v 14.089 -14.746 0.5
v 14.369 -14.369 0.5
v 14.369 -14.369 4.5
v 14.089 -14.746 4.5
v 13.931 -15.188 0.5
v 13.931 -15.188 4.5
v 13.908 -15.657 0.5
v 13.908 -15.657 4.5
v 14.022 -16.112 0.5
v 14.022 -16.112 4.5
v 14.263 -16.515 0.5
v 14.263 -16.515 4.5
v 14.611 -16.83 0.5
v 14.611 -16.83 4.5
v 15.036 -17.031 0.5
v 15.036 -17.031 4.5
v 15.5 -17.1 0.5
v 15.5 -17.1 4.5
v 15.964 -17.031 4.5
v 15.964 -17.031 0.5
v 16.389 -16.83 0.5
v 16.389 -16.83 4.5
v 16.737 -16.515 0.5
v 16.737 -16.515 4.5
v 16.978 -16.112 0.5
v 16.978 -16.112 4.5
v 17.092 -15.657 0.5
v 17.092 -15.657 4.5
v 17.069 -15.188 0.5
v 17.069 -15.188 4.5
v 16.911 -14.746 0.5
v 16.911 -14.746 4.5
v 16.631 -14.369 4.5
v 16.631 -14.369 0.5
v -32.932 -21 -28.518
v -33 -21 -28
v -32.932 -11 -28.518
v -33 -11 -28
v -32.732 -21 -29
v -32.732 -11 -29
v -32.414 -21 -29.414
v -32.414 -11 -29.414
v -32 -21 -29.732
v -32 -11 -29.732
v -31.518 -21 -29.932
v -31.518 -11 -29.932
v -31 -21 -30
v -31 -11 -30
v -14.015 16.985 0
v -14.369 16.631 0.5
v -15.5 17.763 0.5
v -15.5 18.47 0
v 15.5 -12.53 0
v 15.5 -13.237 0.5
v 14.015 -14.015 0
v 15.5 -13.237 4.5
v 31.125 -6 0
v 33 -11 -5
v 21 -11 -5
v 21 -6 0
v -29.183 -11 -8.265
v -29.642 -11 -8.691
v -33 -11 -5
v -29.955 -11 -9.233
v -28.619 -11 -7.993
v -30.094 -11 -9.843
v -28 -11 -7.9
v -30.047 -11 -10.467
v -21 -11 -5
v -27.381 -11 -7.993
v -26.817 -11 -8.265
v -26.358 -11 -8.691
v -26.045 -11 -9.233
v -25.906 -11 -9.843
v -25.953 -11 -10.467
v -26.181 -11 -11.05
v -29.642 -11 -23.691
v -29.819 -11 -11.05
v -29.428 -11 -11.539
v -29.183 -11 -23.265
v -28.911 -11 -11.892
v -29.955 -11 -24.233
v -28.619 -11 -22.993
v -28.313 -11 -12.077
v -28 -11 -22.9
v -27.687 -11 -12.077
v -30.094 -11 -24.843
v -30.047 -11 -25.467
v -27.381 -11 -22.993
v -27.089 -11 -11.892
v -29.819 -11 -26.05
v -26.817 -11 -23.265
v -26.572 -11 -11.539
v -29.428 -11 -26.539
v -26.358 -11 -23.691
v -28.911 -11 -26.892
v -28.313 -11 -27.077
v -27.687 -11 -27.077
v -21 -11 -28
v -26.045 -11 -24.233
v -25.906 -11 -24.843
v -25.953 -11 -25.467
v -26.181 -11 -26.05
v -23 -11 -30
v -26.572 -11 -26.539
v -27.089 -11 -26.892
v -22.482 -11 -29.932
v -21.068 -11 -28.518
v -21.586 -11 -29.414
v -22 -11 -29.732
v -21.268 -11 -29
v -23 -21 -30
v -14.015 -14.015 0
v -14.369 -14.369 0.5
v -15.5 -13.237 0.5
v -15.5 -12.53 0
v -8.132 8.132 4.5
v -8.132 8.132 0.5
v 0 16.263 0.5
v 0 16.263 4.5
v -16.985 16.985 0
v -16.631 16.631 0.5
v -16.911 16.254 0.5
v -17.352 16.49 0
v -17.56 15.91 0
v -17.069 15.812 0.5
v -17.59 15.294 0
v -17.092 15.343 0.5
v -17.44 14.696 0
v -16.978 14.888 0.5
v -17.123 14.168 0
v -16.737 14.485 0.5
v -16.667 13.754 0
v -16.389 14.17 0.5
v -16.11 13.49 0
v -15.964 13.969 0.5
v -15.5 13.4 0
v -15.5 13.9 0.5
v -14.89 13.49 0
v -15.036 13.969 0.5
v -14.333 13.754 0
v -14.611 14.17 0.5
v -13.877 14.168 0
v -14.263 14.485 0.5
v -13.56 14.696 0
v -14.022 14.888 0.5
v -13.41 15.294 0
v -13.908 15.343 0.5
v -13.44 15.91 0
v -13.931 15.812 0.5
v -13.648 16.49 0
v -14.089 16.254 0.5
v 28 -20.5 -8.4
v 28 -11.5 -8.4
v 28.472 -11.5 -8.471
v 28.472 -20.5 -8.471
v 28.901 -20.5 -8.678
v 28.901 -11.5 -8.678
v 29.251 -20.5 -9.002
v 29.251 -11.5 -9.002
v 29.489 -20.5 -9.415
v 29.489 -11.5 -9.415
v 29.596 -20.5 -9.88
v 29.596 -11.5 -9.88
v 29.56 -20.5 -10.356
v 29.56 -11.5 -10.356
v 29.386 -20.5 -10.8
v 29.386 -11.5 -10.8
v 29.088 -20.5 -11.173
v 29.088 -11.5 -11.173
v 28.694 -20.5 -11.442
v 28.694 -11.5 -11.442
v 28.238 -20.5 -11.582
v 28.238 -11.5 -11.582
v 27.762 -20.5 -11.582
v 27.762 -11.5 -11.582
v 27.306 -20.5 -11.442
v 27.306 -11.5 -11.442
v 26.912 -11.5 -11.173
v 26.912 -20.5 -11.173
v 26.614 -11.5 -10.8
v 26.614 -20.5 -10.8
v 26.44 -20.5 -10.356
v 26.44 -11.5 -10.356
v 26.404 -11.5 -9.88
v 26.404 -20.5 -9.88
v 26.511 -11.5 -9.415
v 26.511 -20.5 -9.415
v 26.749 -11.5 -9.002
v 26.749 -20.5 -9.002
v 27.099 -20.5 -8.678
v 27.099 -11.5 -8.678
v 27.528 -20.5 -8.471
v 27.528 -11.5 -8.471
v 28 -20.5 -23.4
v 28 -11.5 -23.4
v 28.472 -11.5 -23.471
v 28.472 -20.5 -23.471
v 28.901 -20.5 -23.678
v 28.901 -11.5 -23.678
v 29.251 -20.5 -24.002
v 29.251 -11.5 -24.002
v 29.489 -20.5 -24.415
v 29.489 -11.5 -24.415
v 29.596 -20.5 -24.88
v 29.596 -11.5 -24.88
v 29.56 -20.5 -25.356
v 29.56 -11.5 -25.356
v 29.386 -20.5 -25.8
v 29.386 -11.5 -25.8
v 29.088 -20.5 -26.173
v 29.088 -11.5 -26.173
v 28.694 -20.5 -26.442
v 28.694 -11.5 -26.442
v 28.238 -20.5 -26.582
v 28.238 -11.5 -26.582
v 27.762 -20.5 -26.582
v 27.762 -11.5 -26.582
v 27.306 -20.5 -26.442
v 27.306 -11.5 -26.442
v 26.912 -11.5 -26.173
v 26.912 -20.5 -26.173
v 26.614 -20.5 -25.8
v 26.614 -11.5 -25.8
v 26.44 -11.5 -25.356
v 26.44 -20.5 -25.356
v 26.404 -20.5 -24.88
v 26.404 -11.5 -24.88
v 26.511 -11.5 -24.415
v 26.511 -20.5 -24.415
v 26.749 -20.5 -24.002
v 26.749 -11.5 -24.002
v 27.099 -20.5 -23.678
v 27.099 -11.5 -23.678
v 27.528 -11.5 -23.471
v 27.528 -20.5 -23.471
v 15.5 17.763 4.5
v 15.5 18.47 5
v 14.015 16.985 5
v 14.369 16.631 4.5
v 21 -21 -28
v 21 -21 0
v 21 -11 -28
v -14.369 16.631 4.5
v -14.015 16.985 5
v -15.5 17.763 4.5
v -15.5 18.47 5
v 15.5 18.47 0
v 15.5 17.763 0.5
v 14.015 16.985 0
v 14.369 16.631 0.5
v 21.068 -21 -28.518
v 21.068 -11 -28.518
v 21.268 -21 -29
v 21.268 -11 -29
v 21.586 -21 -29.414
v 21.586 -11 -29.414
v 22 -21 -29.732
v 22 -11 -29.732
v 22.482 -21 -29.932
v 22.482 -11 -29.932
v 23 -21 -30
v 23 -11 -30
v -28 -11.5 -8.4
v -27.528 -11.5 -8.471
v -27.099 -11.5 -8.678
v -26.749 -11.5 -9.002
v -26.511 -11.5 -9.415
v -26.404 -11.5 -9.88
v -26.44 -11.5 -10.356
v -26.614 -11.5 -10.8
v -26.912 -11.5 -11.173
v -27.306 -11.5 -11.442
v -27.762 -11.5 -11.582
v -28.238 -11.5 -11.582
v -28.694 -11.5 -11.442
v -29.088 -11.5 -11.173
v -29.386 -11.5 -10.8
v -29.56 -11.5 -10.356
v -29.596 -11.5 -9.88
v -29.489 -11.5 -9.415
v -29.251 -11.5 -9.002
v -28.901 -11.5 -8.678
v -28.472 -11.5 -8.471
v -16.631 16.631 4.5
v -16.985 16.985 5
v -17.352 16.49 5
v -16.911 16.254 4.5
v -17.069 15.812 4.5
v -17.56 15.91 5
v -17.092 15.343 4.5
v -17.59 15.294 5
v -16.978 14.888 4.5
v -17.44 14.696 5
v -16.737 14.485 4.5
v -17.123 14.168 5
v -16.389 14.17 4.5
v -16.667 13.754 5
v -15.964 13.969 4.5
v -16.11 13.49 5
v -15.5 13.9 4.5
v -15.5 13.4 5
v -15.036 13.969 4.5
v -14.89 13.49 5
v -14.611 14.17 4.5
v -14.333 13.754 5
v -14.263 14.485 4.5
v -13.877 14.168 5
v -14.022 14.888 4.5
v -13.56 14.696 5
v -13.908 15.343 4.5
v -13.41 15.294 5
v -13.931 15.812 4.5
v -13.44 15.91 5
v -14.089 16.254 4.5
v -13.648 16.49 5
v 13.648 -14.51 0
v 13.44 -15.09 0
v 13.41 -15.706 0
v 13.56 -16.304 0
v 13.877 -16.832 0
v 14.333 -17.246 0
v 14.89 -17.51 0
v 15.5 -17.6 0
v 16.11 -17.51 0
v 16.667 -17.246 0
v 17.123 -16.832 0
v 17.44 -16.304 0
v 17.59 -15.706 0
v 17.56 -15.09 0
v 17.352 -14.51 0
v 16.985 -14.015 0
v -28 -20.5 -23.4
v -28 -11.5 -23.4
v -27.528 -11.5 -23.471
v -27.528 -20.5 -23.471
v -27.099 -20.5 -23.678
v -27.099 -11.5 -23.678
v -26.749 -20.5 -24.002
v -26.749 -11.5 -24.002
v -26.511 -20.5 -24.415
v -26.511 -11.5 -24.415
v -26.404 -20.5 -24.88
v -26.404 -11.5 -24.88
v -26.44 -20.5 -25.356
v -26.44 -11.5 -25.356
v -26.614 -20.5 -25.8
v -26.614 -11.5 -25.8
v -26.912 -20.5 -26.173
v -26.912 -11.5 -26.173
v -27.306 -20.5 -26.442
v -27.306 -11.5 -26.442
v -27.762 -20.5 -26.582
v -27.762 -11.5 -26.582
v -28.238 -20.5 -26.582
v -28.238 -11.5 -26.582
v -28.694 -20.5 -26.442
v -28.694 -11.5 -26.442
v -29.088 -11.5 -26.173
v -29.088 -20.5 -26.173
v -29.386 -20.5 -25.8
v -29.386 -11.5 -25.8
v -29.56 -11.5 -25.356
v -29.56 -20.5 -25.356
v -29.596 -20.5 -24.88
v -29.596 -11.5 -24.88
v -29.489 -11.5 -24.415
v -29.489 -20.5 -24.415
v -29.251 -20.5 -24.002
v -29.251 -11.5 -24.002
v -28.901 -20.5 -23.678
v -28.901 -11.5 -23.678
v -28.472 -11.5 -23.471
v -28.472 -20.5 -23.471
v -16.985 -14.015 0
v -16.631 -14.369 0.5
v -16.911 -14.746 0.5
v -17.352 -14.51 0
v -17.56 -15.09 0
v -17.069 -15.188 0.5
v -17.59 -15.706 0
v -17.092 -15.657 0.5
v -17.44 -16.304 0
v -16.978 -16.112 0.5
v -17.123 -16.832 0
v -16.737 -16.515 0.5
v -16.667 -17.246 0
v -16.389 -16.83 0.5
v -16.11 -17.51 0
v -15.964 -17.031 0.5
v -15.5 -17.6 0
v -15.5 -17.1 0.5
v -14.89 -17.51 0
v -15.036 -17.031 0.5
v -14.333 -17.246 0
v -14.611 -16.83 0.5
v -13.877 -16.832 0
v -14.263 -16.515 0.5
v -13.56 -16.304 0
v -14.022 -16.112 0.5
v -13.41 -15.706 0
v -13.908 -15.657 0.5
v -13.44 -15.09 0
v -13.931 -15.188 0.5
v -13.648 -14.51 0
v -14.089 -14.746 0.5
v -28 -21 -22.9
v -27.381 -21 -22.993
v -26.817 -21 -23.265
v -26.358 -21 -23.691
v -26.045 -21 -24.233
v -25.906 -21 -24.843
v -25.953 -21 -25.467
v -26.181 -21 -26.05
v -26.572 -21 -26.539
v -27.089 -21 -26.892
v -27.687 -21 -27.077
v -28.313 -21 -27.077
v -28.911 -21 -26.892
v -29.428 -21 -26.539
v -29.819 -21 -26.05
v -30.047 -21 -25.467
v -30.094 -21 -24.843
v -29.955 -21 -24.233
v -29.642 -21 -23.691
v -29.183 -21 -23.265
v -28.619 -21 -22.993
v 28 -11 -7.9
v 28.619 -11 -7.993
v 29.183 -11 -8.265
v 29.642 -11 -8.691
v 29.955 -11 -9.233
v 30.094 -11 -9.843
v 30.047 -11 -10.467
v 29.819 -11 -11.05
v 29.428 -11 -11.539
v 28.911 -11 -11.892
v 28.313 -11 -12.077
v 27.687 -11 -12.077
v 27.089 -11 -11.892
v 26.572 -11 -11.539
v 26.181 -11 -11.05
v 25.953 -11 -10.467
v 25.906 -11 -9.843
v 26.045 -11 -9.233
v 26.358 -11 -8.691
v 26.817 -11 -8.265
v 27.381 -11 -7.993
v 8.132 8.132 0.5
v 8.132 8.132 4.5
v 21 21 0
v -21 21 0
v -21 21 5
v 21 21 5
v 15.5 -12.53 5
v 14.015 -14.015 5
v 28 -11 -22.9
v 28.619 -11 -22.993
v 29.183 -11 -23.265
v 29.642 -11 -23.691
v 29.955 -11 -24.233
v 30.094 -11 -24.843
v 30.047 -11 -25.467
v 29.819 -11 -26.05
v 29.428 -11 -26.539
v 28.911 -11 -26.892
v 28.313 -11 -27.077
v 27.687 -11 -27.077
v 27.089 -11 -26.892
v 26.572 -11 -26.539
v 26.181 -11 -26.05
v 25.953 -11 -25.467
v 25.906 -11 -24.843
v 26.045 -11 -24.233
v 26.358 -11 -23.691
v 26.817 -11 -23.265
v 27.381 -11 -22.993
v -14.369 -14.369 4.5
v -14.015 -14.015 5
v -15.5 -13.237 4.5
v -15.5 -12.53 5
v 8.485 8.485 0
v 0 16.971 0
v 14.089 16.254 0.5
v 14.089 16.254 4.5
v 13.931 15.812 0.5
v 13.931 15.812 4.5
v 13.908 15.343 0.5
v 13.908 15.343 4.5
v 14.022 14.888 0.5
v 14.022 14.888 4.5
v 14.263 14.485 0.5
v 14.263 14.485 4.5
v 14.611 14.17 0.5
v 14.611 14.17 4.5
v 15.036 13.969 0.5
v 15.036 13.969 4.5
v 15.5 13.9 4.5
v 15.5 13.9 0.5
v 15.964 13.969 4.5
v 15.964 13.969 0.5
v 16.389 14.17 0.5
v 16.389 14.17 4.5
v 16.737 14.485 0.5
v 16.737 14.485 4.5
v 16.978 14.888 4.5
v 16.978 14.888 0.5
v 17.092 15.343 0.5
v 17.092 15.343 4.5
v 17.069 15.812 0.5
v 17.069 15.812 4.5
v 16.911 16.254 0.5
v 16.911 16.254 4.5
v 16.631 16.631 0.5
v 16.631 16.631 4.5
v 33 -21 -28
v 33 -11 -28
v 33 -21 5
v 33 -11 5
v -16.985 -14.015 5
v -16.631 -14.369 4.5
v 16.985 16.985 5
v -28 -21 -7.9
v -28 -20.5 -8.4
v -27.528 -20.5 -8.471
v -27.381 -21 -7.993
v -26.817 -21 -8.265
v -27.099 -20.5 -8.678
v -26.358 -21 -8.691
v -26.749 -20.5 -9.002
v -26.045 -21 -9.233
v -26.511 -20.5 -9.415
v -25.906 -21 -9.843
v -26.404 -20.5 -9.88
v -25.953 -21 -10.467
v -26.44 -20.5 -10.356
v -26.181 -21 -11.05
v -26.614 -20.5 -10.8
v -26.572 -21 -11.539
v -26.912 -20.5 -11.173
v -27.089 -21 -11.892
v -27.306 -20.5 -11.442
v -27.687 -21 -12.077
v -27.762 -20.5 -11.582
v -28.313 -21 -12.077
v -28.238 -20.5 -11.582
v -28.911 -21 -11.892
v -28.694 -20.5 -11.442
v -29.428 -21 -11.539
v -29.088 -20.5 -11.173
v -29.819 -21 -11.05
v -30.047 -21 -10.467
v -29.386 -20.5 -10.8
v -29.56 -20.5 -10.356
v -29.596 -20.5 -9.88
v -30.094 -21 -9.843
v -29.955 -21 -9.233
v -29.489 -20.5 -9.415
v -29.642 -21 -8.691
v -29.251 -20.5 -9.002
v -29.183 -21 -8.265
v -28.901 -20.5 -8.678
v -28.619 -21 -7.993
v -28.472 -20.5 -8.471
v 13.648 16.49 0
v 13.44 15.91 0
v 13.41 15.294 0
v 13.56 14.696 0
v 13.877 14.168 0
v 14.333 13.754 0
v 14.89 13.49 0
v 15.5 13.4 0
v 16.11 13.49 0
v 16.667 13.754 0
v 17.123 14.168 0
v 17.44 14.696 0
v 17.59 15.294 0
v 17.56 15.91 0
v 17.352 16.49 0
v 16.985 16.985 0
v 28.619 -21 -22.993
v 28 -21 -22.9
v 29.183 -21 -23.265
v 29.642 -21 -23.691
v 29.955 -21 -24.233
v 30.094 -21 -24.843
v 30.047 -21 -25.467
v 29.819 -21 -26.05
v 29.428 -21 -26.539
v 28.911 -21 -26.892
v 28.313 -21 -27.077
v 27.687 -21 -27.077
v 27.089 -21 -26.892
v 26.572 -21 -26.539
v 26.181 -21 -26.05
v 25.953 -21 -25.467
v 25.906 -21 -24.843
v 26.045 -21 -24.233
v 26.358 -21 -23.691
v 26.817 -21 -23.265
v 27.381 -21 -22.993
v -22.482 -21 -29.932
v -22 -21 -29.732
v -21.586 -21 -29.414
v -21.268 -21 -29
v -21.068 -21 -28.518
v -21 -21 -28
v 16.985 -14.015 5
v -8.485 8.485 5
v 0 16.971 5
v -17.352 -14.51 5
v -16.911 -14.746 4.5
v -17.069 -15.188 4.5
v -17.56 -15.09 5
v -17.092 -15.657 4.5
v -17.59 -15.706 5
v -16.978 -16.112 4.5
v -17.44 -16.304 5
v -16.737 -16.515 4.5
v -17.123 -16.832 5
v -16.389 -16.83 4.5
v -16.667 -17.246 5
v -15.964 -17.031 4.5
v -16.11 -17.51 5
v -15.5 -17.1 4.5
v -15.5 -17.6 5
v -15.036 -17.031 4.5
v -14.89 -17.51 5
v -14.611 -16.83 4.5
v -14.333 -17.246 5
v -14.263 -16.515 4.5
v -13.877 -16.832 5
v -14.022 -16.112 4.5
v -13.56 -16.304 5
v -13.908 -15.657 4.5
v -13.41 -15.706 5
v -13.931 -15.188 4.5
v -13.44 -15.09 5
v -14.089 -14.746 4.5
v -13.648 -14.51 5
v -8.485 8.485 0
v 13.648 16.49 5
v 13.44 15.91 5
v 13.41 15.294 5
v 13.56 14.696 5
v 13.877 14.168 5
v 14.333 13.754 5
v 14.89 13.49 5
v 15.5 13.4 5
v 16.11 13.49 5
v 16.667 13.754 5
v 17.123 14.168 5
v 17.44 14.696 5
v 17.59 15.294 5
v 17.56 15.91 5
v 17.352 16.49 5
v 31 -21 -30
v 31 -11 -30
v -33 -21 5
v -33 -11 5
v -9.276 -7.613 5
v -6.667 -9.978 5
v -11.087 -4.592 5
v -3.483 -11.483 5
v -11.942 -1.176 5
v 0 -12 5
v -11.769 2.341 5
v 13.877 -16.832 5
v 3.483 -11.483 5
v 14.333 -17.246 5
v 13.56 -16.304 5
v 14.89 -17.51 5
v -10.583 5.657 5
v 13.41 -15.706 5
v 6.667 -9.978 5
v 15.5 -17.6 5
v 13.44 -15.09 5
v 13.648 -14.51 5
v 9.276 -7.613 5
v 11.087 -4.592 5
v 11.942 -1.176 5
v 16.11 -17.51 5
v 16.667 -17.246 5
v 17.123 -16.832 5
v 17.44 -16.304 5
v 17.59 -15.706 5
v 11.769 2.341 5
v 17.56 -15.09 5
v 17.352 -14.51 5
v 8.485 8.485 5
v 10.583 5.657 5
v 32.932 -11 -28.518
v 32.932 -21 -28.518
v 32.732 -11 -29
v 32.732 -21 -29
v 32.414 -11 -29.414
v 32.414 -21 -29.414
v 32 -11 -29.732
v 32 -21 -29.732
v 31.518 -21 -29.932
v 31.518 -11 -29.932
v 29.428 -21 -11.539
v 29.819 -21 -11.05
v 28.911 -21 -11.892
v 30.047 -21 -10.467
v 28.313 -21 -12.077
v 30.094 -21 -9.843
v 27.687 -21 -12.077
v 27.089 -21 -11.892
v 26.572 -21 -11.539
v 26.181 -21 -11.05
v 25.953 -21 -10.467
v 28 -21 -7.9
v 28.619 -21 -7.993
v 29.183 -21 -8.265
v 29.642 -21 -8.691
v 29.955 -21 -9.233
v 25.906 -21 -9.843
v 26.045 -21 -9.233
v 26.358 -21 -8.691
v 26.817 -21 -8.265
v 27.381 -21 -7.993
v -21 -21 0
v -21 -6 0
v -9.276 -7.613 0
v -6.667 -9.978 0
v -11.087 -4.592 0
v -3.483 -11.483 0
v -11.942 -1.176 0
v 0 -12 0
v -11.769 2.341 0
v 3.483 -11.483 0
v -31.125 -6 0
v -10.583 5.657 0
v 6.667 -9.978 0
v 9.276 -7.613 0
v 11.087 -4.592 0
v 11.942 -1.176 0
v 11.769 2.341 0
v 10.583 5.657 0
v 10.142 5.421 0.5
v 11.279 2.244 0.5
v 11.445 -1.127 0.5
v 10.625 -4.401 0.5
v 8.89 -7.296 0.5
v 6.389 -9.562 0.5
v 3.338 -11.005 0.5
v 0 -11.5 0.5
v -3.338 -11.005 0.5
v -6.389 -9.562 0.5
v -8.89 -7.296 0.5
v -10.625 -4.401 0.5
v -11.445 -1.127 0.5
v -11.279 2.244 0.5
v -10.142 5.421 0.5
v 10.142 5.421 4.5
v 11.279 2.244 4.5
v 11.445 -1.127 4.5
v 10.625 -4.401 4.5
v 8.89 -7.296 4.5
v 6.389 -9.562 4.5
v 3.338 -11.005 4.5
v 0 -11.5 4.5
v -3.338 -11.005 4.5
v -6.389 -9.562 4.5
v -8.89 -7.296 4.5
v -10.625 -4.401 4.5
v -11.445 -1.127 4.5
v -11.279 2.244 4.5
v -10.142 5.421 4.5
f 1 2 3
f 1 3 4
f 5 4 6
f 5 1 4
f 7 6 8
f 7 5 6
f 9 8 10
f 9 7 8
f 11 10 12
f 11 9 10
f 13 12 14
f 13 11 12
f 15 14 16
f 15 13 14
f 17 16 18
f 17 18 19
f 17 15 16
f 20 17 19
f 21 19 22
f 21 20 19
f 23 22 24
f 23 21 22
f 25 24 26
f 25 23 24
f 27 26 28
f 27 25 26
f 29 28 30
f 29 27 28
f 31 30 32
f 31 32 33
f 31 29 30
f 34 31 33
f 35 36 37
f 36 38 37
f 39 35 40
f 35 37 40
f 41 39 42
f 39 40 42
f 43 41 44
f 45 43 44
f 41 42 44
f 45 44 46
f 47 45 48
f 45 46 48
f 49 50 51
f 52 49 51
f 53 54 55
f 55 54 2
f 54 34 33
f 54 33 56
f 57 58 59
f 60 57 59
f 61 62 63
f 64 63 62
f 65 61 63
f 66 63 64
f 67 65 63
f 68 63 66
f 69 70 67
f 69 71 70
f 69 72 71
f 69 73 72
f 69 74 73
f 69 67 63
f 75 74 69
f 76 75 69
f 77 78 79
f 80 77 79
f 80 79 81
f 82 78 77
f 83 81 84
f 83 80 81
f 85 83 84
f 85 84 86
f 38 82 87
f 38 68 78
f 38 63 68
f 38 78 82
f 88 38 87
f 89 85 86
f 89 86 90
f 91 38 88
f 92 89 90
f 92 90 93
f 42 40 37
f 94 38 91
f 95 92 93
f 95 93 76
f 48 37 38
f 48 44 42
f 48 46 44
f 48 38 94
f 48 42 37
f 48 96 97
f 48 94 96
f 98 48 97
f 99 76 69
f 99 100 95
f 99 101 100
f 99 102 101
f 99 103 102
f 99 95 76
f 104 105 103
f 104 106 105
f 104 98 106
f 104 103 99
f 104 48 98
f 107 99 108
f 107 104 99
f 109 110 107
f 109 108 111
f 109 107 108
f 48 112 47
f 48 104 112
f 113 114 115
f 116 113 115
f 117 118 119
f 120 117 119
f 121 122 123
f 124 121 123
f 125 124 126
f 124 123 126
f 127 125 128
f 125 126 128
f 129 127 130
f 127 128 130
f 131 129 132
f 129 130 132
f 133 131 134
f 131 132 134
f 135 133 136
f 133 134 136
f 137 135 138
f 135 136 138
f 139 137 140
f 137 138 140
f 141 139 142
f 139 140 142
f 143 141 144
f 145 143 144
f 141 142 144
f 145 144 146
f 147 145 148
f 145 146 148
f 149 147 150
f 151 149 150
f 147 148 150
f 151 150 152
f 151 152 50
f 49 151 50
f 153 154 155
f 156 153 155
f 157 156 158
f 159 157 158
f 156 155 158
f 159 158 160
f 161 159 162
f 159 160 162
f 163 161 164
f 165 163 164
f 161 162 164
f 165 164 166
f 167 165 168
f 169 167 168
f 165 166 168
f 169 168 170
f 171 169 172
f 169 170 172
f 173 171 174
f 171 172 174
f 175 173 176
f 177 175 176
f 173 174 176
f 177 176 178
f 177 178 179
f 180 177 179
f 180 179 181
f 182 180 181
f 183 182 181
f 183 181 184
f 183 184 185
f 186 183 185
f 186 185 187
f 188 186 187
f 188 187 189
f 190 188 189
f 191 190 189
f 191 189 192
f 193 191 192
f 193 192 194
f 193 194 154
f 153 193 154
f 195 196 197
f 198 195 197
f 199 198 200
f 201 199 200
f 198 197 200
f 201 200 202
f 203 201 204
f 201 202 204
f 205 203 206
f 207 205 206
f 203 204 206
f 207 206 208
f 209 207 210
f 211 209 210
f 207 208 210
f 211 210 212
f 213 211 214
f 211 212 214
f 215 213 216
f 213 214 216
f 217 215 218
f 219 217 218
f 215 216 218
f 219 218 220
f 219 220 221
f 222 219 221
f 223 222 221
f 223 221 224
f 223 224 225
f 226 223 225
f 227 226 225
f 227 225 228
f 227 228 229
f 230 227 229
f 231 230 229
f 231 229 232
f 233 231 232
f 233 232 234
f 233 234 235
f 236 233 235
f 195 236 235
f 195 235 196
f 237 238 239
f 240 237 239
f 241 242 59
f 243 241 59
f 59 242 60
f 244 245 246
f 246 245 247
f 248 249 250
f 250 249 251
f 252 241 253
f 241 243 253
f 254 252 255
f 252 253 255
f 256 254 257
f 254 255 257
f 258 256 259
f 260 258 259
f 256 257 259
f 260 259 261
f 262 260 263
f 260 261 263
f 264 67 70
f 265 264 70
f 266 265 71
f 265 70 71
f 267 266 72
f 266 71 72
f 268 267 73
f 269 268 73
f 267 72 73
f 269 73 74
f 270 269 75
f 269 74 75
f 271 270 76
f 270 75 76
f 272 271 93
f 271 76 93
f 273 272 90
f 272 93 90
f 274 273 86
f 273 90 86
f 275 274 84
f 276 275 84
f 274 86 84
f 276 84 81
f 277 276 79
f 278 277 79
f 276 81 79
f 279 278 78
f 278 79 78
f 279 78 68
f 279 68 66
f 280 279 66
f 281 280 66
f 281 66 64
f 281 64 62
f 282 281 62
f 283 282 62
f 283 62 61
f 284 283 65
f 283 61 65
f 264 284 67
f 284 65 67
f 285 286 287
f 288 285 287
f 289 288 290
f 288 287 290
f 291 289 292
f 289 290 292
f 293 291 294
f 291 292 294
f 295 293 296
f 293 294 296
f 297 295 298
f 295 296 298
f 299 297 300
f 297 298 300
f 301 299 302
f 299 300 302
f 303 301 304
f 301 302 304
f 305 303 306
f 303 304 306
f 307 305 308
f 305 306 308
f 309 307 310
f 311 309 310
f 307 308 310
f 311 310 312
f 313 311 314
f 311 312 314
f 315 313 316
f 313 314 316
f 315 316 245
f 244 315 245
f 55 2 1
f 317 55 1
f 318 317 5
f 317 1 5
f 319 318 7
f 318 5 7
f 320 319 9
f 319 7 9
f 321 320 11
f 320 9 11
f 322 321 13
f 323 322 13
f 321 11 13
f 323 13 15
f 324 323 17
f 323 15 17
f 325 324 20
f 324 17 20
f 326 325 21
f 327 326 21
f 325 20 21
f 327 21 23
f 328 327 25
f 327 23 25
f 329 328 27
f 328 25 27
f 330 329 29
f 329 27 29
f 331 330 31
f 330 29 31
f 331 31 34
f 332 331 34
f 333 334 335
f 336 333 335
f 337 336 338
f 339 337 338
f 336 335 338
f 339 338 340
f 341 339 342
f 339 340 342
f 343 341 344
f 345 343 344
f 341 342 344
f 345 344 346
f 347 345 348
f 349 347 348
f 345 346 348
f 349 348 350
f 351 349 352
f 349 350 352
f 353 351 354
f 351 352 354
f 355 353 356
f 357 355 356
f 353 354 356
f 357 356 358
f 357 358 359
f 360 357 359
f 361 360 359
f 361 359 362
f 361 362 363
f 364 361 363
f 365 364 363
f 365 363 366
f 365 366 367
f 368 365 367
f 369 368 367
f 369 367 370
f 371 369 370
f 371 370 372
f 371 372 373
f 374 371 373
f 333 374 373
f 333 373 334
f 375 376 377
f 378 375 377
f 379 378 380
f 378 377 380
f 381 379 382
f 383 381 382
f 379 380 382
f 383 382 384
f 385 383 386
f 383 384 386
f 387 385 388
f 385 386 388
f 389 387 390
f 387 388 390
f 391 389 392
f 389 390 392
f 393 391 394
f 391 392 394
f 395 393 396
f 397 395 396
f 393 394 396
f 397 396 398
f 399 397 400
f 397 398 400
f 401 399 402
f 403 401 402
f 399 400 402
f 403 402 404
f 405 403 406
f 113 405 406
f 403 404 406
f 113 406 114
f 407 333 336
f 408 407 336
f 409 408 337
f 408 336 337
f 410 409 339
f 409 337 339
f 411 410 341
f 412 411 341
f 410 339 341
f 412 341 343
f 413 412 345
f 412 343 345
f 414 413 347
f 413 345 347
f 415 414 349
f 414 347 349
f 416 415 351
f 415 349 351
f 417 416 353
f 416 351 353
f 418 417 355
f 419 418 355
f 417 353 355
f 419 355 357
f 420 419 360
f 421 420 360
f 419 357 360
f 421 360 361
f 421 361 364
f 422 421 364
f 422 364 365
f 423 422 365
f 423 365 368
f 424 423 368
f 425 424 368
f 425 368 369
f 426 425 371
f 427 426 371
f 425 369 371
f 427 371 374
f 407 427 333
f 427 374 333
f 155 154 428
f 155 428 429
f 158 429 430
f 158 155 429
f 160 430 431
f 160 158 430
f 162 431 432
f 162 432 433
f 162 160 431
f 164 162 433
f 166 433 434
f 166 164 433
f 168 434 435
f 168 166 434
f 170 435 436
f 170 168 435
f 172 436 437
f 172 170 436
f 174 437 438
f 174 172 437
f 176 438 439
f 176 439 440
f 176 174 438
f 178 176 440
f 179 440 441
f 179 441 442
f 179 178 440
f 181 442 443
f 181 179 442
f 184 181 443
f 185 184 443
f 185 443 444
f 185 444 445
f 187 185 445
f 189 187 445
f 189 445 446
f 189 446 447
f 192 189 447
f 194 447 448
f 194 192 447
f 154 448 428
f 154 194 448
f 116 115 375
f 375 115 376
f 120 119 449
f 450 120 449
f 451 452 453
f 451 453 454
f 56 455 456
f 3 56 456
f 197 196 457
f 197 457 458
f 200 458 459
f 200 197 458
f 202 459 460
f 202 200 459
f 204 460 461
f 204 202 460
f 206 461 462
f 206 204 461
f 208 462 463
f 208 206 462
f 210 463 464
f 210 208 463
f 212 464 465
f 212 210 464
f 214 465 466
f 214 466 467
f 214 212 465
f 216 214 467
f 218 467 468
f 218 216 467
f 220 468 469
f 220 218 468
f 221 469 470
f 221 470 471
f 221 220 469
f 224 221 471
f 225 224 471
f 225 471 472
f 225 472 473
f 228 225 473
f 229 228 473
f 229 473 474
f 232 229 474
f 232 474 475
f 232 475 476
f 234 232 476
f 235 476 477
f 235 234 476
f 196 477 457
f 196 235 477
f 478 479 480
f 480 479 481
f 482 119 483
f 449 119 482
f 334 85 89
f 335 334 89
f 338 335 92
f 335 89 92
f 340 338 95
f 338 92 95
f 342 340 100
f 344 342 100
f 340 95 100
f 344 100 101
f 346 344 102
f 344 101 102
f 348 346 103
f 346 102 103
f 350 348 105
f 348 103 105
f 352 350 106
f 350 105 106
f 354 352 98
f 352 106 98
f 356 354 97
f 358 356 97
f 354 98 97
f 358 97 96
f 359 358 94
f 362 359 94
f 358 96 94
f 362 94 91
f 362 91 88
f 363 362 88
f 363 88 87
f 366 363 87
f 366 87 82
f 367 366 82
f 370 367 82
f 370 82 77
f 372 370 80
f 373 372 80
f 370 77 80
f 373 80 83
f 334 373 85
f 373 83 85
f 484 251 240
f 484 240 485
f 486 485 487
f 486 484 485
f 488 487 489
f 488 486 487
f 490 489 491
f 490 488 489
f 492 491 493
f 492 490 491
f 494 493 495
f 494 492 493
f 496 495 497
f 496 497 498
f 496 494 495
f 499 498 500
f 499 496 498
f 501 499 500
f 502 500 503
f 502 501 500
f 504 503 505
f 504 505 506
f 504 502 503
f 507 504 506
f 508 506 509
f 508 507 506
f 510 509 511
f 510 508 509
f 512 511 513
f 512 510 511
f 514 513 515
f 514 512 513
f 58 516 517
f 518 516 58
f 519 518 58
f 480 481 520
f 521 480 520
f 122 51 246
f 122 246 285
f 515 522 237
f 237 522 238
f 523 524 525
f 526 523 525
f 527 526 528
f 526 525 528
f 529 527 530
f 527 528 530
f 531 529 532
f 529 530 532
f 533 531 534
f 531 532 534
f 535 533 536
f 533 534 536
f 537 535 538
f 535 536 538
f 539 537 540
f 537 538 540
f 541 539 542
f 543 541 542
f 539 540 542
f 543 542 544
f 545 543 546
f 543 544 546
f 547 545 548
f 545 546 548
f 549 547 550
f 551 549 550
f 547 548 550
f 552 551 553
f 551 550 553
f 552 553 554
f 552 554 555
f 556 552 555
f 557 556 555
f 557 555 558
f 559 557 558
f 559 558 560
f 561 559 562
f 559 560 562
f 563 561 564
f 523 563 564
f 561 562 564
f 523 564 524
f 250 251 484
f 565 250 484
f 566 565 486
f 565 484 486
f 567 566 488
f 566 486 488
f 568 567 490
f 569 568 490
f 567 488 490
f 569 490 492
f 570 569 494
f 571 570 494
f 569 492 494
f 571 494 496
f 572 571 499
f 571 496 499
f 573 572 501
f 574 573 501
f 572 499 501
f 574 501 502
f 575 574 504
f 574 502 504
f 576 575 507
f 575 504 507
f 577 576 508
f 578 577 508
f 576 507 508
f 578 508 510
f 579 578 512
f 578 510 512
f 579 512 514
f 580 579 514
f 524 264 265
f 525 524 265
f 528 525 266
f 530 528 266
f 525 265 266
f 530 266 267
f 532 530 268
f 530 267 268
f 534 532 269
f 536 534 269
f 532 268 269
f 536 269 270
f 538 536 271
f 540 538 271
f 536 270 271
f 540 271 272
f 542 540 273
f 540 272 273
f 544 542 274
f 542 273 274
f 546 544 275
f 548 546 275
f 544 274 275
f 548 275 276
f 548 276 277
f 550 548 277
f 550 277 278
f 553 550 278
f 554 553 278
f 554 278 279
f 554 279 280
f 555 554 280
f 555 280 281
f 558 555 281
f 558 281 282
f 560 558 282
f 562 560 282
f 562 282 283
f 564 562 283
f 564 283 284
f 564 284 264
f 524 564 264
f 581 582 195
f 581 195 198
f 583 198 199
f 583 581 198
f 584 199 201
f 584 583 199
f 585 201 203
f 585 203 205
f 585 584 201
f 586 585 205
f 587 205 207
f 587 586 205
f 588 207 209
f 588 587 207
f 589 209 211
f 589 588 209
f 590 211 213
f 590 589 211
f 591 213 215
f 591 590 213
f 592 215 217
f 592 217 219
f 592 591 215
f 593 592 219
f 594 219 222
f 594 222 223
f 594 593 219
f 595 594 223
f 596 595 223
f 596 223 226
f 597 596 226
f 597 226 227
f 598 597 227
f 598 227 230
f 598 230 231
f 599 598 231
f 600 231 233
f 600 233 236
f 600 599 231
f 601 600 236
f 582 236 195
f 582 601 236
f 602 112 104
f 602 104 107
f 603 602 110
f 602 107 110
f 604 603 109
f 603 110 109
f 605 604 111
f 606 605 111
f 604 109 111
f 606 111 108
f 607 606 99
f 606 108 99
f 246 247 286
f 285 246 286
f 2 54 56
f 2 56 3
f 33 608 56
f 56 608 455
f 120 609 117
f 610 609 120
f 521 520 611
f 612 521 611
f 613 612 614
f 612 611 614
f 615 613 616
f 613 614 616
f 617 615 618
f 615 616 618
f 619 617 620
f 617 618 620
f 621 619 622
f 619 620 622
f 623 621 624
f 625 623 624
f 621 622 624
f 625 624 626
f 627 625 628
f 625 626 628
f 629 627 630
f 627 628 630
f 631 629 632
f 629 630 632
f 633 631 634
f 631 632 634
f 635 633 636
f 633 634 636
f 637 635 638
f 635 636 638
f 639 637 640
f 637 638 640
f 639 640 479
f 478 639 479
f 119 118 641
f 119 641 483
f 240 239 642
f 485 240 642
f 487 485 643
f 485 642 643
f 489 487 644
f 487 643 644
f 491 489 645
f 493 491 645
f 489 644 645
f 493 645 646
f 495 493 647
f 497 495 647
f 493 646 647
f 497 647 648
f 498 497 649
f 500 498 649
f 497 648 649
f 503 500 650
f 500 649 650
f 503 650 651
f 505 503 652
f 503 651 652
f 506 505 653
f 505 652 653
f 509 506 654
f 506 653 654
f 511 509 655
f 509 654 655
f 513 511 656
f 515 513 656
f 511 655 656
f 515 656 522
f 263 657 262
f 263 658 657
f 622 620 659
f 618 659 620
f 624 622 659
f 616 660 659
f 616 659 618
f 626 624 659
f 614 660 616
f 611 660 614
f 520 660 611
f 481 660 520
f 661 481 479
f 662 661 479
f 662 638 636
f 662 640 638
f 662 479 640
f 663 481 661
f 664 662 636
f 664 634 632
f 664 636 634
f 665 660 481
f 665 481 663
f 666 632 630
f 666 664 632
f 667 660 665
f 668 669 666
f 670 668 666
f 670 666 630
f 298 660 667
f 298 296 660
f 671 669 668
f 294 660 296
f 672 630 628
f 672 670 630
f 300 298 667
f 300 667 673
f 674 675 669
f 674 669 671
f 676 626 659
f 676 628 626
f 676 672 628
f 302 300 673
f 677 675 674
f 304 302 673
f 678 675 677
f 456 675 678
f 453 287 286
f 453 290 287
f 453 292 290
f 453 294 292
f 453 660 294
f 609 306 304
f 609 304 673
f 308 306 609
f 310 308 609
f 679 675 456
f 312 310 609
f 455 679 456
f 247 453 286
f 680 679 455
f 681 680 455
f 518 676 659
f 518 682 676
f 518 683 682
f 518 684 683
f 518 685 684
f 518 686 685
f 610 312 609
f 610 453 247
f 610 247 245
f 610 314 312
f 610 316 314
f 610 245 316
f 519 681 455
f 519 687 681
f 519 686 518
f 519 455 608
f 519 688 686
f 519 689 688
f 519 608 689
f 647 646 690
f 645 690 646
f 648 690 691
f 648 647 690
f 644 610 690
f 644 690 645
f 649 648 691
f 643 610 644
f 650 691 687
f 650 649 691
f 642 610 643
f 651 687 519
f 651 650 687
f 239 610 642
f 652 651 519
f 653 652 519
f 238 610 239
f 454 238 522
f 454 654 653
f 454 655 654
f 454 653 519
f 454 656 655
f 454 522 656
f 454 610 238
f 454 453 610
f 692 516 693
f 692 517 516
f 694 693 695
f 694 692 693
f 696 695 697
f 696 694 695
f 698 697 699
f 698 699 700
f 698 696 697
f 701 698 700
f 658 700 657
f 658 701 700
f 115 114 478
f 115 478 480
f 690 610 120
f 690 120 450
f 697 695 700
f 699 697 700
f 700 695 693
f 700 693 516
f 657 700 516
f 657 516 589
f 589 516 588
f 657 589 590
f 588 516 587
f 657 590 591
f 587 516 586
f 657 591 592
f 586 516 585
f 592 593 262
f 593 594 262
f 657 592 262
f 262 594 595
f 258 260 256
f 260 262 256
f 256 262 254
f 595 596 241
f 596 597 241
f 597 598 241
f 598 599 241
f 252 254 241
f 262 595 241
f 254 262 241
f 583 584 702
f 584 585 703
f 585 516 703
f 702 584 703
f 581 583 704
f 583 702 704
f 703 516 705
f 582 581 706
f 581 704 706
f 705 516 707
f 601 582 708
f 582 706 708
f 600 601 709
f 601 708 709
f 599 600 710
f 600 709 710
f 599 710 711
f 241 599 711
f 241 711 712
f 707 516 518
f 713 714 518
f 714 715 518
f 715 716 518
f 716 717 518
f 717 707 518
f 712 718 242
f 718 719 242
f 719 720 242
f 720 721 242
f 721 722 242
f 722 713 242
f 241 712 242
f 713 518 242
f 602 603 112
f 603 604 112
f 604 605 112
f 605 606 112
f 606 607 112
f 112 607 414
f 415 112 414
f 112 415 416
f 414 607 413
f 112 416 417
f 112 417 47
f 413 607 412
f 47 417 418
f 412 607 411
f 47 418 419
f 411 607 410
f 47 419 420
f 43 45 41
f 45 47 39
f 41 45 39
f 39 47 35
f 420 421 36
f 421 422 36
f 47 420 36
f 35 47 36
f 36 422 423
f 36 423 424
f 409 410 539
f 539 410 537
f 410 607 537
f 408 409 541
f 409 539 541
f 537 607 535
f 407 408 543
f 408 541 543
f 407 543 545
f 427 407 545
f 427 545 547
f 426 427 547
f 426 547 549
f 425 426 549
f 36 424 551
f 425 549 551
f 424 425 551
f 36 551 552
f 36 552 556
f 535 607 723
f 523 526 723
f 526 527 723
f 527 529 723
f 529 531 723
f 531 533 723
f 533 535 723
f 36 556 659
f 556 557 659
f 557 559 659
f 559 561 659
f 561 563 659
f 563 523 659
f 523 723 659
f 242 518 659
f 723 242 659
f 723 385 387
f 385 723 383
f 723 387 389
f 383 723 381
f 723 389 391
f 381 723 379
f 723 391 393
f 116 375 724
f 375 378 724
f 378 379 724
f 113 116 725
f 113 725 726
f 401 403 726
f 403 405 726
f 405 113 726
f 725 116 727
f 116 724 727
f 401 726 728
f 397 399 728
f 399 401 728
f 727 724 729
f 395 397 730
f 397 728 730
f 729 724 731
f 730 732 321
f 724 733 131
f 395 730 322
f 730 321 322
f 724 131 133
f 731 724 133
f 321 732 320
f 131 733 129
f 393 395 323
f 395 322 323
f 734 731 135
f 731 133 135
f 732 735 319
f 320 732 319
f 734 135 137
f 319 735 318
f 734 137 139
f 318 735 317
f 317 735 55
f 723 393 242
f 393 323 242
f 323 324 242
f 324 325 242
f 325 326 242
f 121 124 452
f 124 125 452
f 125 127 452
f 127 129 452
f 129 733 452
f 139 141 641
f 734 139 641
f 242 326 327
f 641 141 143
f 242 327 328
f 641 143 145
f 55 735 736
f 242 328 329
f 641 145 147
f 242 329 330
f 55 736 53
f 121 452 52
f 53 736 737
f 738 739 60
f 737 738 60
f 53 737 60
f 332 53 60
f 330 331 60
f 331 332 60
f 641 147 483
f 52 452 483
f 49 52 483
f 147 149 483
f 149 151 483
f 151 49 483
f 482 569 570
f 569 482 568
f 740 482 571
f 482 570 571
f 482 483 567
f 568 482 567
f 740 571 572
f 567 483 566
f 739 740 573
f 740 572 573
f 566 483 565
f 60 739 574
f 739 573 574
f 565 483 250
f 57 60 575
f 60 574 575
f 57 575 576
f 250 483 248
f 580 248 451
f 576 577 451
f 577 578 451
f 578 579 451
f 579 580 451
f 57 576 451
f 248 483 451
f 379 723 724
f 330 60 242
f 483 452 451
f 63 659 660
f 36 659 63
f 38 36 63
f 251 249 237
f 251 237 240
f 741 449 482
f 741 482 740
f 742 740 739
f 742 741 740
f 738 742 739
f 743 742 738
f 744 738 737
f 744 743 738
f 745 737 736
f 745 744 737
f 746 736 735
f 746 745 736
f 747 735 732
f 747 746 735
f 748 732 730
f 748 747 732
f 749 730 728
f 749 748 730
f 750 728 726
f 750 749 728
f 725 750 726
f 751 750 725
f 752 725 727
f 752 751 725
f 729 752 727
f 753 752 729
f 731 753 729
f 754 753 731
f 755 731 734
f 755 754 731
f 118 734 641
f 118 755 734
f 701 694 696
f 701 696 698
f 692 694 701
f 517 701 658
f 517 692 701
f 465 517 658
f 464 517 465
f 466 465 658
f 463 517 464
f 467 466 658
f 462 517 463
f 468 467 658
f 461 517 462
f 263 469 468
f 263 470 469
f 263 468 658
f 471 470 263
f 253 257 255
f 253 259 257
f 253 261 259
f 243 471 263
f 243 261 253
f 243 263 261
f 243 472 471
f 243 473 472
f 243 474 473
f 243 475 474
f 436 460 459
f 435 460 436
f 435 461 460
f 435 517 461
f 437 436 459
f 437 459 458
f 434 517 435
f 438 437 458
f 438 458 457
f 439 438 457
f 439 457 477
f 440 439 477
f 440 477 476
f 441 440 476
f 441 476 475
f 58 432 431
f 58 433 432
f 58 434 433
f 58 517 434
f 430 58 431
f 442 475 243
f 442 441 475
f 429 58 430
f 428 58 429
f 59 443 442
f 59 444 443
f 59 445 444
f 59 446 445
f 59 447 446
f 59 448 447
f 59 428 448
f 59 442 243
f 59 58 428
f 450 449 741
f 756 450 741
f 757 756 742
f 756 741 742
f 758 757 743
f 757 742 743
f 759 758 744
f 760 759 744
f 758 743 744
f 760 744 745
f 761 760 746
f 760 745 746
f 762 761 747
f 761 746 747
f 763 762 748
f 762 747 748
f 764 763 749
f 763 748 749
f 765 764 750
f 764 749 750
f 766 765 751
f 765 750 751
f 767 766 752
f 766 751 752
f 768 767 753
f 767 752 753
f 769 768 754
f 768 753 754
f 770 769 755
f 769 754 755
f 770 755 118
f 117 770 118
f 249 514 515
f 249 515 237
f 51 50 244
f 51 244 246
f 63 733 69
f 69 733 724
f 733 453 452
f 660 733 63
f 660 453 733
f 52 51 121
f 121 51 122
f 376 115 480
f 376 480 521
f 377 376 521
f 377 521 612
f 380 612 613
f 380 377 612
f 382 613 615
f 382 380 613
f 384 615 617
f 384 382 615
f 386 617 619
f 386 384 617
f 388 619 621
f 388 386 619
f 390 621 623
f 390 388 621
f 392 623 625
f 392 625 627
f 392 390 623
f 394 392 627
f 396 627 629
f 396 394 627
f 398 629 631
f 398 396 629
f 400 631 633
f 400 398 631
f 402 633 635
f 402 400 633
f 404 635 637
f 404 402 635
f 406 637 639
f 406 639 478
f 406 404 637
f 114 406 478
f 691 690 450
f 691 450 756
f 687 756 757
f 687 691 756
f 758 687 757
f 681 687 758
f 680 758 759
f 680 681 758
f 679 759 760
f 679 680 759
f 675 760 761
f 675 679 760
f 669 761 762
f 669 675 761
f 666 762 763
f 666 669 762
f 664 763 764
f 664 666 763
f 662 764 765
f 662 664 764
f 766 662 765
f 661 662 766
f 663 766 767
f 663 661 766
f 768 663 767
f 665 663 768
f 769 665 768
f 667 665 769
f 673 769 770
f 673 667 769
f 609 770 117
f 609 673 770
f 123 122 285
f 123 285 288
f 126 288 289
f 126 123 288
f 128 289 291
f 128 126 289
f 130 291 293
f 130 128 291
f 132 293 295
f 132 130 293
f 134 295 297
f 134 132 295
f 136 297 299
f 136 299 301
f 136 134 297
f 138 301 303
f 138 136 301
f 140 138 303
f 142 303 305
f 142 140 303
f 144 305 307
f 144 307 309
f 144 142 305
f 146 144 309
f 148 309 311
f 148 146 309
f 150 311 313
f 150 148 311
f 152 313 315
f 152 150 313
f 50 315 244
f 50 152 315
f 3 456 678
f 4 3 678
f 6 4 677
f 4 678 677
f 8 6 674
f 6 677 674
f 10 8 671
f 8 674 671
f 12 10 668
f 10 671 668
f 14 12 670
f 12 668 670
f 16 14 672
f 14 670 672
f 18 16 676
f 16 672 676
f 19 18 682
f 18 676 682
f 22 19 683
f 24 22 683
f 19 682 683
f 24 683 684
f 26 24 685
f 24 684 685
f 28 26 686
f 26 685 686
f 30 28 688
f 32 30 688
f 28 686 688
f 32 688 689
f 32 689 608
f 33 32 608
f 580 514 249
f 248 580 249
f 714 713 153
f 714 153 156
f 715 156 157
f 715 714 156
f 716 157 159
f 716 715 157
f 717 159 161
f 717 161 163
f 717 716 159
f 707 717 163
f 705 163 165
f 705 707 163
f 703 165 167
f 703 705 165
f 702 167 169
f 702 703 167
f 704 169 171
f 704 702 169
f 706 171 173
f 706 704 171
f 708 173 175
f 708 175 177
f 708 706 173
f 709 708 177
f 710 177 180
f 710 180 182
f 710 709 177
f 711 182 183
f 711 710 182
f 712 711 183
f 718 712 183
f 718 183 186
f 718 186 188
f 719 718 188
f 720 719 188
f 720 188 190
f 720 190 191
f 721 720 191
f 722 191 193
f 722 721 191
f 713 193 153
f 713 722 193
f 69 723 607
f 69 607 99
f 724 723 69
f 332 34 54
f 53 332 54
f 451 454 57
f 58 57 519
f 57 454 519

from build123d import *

# Parameters (mm, degrees)
EXTRUDE_1_DEPTH     = 5
SKETCH_2_W          = 12
SKETCH_2_H          = 10
EXTRUDE_2_DEPTH     = 30
EXTRUDE_3_DEPTH     = 5
SKETCH_5_R          = 1.6
CUT_EXTRUDE_1_DEPTH = 55.890800686
FILLET_1_R          = 2
CHAMFER_1_SIZE      = 5
CHAMFER_2_SIZE      = 0.5


with BuildPart() as part:
    # 草图1 → 凸台-拉伸1 (new body)
    with BuildSketch(Plane.XY):
        Polygon((-21, 21), (21, 21), (21, -11), (33, -11), (33, -21), (-33, -21), (-33, -11), (-21, -11), align=None)
        with BuildLine():
            Line((-15.5, 17.7627417), (-16.63137085, 16.63137085))
            ThreePointArc((-16.63137085, 16.63137085), (-15.5, 13.9), (-14.36862915, 16.63137085))
            Line((-14.36862915, 16.63137085), (-15.5, 17.7627417))
        make_face(mode=Mode.SUBTRACT)
        with BuildLine():
            Line((-15.5, -13.2372583), (-16.63137085, -14.36862915))
            ThreePointArc((-16.63137085, -14.36862915), (-15.5, -17.1), (-14.36862915, -14.36862915))
            Line((-14.36862915, -14.36862915), (-15.5, -13.2372583))
        make_face(mode=Mode.SUBTRACT)
        with BuildLine():
            Line((-8.131727984, 8.131727984), (0, 16.263455967))
            Line((0, 16.263455967), (8.131727984, 8.131727984))
            ThreePointArc((8.131727984, 8.131727984), (0, -11.5), (-8.131727984, 8.131727984))
        make_face(mode=Mode.SUBTRACT)
        with BuildLine():
            Line((15.5, -13.2372583), (14.36862915, -14.36862915))
            ThreePointArc((14.36862915, -14.36862915), (15.5, -17.1), (16.63137085, -14.36862915))
            Line((16.63137085, -14.36862915), (15.5, -13.2372583))
        make_face(mode=Mode.SUBTRACT)
        with BuildLine():
            Line((15.5, 17.7627417), (14.36862915, 16.63137085))
            ThreePointArc((14.36862915, 16.63137085), (15.5, 13.9), (16.63137085, 16.63137085))
            Line((16.63137085, 16.63137085), (15.5, 17.7627417))
        make_face(mode=Mode.SUBTRACT)
    extrude(amount=EXTRUDE_1_DEPTH)

    # 草图2 → 凸台-拉伸2 (add)
    with BuildSketch(Plane(origin=(0, 0, 0), x_dir=(-1, 0, 0), z_dir=(0, 0, -1))):
        with Locations((-27, -16)):
            Rectangle(SKETCH_2_W, SKETCH_2_H)
        with Locations((27, -16)):
            Rectangle(SKETCH_2_W, SKETCH_2_H)
    extrude(amount=EXTRUDE_2_DEPTH)

    # 草图3 → 凸台-拉伸3 (add)
    with BuildSketch(Plane.XY.offset(5)):
        Polygon((-21, 21), (-33, -11), (-21, -11), align=None)
        Polygon((21, -11), (21, 21), (33, -11), align=None)
    extrude(amount=-EXTRUDE_3_DEPTH)

    # 草图5 → 切除-拉伸1 (cut, through all)
    with BuildSketch(Plane(origin=(0, -11, 0), x_dir=(1, 0, 0), z_dir=(0, 1, 0))):
        with Locations(Location((28, 25, 0), (0, 0, 270))):
            Circle(SKETCH_5_R)
        with Locations(Location((28, 10, 0), (0, 0, 270))):
            Circle(SKETCH_5_R)
        with Locations(Location((-28, 10, 0), (0, 0, 270))):
            Circle(SKETCH_5_R)
        with Locations(Location((-28, 25, 0), (0, 0, 270))):
            Circle(SKETCH_5_R)
    extrude(amount=-CUT_EXTRUDE_1_DEPTH, mode=Mode.SUBTRACT)

    # 圆角1
    fillet_1_edges = [part.edges().sort_by_distance(p)[0] for p in [
        (33, -16, -30),
        (21, -16, -30),
        (-21, -16, -30),
        (-33, -16, -30),
    ]]
    fillet(fillet_1_edges, radius=FILLET_1_R)

    # 倒角1
    chamfer_1_edges = [part.edges().sort_by_distance(p)[0] for p in [
        (-27, -11, 0),
        (27, -11, 0),
    ]]
    chamfer(chamfer_1_edges, length=CHAMFER_1_SIZE)

    # 倒角2
    chamfer_2_edges = [part.edges().sort_by_distance(p)[0] for p in [
        (-28, -21, -26.6),
        (-28, -11, -26.6),
        (-28, -21, -11.6),
        (-28, -11, -11.6),
        (28, -21, -11.6),
        (28, -11, -11.6),
        (28, -21, -26.6),
        (28, -11, -26.6),
        (0, -11.5, 0),
        (4.065863992, 12.197591975, 0),
        (-4.065863992, 12.197591975, 0),
        (0, -11.5, 5),
        (4.065863992, 12.197591975, 5),
        (-4.065863992, 12.197591975, 5),
        (-15.5, -17.1, 0),
        (-14.934314575, -13.802943725, 0),
        (-16.065685425, -13.802943725, 0),
        (-15.5, -17.1, 5),
        (-14.934314575, -13.802943725, 5),
        (-16.065685425, -13.802943725, 5),
        (-15.5, 13.9, 0),
        (-14.934314575, 17.197056275, 0),
        (-16.065685425, 17.197056275, 0),
        (-15.5, 13.9, 5),
        (-14.934314575, 17.197056275, 5),
        (-16.065685425, 17.197056275, 5),
        (16.065685425, 17.197056275, 0),
        (14.934314575, 17.197056275, 0),
        (15.5, 13.9, 0),
        (16.065685425, 17.197056275, 5),
        (14.934314575, 17.197056275, 5),
        (15.5, 13.9, 5),
        (15.5, -17.1, 0),
        (16.065685425, -13.802943725, 0),
        (14.934314575, -13.802943725, 0),
        (15.5, -17.1, 5),
        (16.065685425, -13.802943725, 5),
        (14.934314575, -13.802943725, 5),
    ]]
    chamfer(chamfer_2_edges, length=CHAMFER_2_SIZE)


solid = part.part
